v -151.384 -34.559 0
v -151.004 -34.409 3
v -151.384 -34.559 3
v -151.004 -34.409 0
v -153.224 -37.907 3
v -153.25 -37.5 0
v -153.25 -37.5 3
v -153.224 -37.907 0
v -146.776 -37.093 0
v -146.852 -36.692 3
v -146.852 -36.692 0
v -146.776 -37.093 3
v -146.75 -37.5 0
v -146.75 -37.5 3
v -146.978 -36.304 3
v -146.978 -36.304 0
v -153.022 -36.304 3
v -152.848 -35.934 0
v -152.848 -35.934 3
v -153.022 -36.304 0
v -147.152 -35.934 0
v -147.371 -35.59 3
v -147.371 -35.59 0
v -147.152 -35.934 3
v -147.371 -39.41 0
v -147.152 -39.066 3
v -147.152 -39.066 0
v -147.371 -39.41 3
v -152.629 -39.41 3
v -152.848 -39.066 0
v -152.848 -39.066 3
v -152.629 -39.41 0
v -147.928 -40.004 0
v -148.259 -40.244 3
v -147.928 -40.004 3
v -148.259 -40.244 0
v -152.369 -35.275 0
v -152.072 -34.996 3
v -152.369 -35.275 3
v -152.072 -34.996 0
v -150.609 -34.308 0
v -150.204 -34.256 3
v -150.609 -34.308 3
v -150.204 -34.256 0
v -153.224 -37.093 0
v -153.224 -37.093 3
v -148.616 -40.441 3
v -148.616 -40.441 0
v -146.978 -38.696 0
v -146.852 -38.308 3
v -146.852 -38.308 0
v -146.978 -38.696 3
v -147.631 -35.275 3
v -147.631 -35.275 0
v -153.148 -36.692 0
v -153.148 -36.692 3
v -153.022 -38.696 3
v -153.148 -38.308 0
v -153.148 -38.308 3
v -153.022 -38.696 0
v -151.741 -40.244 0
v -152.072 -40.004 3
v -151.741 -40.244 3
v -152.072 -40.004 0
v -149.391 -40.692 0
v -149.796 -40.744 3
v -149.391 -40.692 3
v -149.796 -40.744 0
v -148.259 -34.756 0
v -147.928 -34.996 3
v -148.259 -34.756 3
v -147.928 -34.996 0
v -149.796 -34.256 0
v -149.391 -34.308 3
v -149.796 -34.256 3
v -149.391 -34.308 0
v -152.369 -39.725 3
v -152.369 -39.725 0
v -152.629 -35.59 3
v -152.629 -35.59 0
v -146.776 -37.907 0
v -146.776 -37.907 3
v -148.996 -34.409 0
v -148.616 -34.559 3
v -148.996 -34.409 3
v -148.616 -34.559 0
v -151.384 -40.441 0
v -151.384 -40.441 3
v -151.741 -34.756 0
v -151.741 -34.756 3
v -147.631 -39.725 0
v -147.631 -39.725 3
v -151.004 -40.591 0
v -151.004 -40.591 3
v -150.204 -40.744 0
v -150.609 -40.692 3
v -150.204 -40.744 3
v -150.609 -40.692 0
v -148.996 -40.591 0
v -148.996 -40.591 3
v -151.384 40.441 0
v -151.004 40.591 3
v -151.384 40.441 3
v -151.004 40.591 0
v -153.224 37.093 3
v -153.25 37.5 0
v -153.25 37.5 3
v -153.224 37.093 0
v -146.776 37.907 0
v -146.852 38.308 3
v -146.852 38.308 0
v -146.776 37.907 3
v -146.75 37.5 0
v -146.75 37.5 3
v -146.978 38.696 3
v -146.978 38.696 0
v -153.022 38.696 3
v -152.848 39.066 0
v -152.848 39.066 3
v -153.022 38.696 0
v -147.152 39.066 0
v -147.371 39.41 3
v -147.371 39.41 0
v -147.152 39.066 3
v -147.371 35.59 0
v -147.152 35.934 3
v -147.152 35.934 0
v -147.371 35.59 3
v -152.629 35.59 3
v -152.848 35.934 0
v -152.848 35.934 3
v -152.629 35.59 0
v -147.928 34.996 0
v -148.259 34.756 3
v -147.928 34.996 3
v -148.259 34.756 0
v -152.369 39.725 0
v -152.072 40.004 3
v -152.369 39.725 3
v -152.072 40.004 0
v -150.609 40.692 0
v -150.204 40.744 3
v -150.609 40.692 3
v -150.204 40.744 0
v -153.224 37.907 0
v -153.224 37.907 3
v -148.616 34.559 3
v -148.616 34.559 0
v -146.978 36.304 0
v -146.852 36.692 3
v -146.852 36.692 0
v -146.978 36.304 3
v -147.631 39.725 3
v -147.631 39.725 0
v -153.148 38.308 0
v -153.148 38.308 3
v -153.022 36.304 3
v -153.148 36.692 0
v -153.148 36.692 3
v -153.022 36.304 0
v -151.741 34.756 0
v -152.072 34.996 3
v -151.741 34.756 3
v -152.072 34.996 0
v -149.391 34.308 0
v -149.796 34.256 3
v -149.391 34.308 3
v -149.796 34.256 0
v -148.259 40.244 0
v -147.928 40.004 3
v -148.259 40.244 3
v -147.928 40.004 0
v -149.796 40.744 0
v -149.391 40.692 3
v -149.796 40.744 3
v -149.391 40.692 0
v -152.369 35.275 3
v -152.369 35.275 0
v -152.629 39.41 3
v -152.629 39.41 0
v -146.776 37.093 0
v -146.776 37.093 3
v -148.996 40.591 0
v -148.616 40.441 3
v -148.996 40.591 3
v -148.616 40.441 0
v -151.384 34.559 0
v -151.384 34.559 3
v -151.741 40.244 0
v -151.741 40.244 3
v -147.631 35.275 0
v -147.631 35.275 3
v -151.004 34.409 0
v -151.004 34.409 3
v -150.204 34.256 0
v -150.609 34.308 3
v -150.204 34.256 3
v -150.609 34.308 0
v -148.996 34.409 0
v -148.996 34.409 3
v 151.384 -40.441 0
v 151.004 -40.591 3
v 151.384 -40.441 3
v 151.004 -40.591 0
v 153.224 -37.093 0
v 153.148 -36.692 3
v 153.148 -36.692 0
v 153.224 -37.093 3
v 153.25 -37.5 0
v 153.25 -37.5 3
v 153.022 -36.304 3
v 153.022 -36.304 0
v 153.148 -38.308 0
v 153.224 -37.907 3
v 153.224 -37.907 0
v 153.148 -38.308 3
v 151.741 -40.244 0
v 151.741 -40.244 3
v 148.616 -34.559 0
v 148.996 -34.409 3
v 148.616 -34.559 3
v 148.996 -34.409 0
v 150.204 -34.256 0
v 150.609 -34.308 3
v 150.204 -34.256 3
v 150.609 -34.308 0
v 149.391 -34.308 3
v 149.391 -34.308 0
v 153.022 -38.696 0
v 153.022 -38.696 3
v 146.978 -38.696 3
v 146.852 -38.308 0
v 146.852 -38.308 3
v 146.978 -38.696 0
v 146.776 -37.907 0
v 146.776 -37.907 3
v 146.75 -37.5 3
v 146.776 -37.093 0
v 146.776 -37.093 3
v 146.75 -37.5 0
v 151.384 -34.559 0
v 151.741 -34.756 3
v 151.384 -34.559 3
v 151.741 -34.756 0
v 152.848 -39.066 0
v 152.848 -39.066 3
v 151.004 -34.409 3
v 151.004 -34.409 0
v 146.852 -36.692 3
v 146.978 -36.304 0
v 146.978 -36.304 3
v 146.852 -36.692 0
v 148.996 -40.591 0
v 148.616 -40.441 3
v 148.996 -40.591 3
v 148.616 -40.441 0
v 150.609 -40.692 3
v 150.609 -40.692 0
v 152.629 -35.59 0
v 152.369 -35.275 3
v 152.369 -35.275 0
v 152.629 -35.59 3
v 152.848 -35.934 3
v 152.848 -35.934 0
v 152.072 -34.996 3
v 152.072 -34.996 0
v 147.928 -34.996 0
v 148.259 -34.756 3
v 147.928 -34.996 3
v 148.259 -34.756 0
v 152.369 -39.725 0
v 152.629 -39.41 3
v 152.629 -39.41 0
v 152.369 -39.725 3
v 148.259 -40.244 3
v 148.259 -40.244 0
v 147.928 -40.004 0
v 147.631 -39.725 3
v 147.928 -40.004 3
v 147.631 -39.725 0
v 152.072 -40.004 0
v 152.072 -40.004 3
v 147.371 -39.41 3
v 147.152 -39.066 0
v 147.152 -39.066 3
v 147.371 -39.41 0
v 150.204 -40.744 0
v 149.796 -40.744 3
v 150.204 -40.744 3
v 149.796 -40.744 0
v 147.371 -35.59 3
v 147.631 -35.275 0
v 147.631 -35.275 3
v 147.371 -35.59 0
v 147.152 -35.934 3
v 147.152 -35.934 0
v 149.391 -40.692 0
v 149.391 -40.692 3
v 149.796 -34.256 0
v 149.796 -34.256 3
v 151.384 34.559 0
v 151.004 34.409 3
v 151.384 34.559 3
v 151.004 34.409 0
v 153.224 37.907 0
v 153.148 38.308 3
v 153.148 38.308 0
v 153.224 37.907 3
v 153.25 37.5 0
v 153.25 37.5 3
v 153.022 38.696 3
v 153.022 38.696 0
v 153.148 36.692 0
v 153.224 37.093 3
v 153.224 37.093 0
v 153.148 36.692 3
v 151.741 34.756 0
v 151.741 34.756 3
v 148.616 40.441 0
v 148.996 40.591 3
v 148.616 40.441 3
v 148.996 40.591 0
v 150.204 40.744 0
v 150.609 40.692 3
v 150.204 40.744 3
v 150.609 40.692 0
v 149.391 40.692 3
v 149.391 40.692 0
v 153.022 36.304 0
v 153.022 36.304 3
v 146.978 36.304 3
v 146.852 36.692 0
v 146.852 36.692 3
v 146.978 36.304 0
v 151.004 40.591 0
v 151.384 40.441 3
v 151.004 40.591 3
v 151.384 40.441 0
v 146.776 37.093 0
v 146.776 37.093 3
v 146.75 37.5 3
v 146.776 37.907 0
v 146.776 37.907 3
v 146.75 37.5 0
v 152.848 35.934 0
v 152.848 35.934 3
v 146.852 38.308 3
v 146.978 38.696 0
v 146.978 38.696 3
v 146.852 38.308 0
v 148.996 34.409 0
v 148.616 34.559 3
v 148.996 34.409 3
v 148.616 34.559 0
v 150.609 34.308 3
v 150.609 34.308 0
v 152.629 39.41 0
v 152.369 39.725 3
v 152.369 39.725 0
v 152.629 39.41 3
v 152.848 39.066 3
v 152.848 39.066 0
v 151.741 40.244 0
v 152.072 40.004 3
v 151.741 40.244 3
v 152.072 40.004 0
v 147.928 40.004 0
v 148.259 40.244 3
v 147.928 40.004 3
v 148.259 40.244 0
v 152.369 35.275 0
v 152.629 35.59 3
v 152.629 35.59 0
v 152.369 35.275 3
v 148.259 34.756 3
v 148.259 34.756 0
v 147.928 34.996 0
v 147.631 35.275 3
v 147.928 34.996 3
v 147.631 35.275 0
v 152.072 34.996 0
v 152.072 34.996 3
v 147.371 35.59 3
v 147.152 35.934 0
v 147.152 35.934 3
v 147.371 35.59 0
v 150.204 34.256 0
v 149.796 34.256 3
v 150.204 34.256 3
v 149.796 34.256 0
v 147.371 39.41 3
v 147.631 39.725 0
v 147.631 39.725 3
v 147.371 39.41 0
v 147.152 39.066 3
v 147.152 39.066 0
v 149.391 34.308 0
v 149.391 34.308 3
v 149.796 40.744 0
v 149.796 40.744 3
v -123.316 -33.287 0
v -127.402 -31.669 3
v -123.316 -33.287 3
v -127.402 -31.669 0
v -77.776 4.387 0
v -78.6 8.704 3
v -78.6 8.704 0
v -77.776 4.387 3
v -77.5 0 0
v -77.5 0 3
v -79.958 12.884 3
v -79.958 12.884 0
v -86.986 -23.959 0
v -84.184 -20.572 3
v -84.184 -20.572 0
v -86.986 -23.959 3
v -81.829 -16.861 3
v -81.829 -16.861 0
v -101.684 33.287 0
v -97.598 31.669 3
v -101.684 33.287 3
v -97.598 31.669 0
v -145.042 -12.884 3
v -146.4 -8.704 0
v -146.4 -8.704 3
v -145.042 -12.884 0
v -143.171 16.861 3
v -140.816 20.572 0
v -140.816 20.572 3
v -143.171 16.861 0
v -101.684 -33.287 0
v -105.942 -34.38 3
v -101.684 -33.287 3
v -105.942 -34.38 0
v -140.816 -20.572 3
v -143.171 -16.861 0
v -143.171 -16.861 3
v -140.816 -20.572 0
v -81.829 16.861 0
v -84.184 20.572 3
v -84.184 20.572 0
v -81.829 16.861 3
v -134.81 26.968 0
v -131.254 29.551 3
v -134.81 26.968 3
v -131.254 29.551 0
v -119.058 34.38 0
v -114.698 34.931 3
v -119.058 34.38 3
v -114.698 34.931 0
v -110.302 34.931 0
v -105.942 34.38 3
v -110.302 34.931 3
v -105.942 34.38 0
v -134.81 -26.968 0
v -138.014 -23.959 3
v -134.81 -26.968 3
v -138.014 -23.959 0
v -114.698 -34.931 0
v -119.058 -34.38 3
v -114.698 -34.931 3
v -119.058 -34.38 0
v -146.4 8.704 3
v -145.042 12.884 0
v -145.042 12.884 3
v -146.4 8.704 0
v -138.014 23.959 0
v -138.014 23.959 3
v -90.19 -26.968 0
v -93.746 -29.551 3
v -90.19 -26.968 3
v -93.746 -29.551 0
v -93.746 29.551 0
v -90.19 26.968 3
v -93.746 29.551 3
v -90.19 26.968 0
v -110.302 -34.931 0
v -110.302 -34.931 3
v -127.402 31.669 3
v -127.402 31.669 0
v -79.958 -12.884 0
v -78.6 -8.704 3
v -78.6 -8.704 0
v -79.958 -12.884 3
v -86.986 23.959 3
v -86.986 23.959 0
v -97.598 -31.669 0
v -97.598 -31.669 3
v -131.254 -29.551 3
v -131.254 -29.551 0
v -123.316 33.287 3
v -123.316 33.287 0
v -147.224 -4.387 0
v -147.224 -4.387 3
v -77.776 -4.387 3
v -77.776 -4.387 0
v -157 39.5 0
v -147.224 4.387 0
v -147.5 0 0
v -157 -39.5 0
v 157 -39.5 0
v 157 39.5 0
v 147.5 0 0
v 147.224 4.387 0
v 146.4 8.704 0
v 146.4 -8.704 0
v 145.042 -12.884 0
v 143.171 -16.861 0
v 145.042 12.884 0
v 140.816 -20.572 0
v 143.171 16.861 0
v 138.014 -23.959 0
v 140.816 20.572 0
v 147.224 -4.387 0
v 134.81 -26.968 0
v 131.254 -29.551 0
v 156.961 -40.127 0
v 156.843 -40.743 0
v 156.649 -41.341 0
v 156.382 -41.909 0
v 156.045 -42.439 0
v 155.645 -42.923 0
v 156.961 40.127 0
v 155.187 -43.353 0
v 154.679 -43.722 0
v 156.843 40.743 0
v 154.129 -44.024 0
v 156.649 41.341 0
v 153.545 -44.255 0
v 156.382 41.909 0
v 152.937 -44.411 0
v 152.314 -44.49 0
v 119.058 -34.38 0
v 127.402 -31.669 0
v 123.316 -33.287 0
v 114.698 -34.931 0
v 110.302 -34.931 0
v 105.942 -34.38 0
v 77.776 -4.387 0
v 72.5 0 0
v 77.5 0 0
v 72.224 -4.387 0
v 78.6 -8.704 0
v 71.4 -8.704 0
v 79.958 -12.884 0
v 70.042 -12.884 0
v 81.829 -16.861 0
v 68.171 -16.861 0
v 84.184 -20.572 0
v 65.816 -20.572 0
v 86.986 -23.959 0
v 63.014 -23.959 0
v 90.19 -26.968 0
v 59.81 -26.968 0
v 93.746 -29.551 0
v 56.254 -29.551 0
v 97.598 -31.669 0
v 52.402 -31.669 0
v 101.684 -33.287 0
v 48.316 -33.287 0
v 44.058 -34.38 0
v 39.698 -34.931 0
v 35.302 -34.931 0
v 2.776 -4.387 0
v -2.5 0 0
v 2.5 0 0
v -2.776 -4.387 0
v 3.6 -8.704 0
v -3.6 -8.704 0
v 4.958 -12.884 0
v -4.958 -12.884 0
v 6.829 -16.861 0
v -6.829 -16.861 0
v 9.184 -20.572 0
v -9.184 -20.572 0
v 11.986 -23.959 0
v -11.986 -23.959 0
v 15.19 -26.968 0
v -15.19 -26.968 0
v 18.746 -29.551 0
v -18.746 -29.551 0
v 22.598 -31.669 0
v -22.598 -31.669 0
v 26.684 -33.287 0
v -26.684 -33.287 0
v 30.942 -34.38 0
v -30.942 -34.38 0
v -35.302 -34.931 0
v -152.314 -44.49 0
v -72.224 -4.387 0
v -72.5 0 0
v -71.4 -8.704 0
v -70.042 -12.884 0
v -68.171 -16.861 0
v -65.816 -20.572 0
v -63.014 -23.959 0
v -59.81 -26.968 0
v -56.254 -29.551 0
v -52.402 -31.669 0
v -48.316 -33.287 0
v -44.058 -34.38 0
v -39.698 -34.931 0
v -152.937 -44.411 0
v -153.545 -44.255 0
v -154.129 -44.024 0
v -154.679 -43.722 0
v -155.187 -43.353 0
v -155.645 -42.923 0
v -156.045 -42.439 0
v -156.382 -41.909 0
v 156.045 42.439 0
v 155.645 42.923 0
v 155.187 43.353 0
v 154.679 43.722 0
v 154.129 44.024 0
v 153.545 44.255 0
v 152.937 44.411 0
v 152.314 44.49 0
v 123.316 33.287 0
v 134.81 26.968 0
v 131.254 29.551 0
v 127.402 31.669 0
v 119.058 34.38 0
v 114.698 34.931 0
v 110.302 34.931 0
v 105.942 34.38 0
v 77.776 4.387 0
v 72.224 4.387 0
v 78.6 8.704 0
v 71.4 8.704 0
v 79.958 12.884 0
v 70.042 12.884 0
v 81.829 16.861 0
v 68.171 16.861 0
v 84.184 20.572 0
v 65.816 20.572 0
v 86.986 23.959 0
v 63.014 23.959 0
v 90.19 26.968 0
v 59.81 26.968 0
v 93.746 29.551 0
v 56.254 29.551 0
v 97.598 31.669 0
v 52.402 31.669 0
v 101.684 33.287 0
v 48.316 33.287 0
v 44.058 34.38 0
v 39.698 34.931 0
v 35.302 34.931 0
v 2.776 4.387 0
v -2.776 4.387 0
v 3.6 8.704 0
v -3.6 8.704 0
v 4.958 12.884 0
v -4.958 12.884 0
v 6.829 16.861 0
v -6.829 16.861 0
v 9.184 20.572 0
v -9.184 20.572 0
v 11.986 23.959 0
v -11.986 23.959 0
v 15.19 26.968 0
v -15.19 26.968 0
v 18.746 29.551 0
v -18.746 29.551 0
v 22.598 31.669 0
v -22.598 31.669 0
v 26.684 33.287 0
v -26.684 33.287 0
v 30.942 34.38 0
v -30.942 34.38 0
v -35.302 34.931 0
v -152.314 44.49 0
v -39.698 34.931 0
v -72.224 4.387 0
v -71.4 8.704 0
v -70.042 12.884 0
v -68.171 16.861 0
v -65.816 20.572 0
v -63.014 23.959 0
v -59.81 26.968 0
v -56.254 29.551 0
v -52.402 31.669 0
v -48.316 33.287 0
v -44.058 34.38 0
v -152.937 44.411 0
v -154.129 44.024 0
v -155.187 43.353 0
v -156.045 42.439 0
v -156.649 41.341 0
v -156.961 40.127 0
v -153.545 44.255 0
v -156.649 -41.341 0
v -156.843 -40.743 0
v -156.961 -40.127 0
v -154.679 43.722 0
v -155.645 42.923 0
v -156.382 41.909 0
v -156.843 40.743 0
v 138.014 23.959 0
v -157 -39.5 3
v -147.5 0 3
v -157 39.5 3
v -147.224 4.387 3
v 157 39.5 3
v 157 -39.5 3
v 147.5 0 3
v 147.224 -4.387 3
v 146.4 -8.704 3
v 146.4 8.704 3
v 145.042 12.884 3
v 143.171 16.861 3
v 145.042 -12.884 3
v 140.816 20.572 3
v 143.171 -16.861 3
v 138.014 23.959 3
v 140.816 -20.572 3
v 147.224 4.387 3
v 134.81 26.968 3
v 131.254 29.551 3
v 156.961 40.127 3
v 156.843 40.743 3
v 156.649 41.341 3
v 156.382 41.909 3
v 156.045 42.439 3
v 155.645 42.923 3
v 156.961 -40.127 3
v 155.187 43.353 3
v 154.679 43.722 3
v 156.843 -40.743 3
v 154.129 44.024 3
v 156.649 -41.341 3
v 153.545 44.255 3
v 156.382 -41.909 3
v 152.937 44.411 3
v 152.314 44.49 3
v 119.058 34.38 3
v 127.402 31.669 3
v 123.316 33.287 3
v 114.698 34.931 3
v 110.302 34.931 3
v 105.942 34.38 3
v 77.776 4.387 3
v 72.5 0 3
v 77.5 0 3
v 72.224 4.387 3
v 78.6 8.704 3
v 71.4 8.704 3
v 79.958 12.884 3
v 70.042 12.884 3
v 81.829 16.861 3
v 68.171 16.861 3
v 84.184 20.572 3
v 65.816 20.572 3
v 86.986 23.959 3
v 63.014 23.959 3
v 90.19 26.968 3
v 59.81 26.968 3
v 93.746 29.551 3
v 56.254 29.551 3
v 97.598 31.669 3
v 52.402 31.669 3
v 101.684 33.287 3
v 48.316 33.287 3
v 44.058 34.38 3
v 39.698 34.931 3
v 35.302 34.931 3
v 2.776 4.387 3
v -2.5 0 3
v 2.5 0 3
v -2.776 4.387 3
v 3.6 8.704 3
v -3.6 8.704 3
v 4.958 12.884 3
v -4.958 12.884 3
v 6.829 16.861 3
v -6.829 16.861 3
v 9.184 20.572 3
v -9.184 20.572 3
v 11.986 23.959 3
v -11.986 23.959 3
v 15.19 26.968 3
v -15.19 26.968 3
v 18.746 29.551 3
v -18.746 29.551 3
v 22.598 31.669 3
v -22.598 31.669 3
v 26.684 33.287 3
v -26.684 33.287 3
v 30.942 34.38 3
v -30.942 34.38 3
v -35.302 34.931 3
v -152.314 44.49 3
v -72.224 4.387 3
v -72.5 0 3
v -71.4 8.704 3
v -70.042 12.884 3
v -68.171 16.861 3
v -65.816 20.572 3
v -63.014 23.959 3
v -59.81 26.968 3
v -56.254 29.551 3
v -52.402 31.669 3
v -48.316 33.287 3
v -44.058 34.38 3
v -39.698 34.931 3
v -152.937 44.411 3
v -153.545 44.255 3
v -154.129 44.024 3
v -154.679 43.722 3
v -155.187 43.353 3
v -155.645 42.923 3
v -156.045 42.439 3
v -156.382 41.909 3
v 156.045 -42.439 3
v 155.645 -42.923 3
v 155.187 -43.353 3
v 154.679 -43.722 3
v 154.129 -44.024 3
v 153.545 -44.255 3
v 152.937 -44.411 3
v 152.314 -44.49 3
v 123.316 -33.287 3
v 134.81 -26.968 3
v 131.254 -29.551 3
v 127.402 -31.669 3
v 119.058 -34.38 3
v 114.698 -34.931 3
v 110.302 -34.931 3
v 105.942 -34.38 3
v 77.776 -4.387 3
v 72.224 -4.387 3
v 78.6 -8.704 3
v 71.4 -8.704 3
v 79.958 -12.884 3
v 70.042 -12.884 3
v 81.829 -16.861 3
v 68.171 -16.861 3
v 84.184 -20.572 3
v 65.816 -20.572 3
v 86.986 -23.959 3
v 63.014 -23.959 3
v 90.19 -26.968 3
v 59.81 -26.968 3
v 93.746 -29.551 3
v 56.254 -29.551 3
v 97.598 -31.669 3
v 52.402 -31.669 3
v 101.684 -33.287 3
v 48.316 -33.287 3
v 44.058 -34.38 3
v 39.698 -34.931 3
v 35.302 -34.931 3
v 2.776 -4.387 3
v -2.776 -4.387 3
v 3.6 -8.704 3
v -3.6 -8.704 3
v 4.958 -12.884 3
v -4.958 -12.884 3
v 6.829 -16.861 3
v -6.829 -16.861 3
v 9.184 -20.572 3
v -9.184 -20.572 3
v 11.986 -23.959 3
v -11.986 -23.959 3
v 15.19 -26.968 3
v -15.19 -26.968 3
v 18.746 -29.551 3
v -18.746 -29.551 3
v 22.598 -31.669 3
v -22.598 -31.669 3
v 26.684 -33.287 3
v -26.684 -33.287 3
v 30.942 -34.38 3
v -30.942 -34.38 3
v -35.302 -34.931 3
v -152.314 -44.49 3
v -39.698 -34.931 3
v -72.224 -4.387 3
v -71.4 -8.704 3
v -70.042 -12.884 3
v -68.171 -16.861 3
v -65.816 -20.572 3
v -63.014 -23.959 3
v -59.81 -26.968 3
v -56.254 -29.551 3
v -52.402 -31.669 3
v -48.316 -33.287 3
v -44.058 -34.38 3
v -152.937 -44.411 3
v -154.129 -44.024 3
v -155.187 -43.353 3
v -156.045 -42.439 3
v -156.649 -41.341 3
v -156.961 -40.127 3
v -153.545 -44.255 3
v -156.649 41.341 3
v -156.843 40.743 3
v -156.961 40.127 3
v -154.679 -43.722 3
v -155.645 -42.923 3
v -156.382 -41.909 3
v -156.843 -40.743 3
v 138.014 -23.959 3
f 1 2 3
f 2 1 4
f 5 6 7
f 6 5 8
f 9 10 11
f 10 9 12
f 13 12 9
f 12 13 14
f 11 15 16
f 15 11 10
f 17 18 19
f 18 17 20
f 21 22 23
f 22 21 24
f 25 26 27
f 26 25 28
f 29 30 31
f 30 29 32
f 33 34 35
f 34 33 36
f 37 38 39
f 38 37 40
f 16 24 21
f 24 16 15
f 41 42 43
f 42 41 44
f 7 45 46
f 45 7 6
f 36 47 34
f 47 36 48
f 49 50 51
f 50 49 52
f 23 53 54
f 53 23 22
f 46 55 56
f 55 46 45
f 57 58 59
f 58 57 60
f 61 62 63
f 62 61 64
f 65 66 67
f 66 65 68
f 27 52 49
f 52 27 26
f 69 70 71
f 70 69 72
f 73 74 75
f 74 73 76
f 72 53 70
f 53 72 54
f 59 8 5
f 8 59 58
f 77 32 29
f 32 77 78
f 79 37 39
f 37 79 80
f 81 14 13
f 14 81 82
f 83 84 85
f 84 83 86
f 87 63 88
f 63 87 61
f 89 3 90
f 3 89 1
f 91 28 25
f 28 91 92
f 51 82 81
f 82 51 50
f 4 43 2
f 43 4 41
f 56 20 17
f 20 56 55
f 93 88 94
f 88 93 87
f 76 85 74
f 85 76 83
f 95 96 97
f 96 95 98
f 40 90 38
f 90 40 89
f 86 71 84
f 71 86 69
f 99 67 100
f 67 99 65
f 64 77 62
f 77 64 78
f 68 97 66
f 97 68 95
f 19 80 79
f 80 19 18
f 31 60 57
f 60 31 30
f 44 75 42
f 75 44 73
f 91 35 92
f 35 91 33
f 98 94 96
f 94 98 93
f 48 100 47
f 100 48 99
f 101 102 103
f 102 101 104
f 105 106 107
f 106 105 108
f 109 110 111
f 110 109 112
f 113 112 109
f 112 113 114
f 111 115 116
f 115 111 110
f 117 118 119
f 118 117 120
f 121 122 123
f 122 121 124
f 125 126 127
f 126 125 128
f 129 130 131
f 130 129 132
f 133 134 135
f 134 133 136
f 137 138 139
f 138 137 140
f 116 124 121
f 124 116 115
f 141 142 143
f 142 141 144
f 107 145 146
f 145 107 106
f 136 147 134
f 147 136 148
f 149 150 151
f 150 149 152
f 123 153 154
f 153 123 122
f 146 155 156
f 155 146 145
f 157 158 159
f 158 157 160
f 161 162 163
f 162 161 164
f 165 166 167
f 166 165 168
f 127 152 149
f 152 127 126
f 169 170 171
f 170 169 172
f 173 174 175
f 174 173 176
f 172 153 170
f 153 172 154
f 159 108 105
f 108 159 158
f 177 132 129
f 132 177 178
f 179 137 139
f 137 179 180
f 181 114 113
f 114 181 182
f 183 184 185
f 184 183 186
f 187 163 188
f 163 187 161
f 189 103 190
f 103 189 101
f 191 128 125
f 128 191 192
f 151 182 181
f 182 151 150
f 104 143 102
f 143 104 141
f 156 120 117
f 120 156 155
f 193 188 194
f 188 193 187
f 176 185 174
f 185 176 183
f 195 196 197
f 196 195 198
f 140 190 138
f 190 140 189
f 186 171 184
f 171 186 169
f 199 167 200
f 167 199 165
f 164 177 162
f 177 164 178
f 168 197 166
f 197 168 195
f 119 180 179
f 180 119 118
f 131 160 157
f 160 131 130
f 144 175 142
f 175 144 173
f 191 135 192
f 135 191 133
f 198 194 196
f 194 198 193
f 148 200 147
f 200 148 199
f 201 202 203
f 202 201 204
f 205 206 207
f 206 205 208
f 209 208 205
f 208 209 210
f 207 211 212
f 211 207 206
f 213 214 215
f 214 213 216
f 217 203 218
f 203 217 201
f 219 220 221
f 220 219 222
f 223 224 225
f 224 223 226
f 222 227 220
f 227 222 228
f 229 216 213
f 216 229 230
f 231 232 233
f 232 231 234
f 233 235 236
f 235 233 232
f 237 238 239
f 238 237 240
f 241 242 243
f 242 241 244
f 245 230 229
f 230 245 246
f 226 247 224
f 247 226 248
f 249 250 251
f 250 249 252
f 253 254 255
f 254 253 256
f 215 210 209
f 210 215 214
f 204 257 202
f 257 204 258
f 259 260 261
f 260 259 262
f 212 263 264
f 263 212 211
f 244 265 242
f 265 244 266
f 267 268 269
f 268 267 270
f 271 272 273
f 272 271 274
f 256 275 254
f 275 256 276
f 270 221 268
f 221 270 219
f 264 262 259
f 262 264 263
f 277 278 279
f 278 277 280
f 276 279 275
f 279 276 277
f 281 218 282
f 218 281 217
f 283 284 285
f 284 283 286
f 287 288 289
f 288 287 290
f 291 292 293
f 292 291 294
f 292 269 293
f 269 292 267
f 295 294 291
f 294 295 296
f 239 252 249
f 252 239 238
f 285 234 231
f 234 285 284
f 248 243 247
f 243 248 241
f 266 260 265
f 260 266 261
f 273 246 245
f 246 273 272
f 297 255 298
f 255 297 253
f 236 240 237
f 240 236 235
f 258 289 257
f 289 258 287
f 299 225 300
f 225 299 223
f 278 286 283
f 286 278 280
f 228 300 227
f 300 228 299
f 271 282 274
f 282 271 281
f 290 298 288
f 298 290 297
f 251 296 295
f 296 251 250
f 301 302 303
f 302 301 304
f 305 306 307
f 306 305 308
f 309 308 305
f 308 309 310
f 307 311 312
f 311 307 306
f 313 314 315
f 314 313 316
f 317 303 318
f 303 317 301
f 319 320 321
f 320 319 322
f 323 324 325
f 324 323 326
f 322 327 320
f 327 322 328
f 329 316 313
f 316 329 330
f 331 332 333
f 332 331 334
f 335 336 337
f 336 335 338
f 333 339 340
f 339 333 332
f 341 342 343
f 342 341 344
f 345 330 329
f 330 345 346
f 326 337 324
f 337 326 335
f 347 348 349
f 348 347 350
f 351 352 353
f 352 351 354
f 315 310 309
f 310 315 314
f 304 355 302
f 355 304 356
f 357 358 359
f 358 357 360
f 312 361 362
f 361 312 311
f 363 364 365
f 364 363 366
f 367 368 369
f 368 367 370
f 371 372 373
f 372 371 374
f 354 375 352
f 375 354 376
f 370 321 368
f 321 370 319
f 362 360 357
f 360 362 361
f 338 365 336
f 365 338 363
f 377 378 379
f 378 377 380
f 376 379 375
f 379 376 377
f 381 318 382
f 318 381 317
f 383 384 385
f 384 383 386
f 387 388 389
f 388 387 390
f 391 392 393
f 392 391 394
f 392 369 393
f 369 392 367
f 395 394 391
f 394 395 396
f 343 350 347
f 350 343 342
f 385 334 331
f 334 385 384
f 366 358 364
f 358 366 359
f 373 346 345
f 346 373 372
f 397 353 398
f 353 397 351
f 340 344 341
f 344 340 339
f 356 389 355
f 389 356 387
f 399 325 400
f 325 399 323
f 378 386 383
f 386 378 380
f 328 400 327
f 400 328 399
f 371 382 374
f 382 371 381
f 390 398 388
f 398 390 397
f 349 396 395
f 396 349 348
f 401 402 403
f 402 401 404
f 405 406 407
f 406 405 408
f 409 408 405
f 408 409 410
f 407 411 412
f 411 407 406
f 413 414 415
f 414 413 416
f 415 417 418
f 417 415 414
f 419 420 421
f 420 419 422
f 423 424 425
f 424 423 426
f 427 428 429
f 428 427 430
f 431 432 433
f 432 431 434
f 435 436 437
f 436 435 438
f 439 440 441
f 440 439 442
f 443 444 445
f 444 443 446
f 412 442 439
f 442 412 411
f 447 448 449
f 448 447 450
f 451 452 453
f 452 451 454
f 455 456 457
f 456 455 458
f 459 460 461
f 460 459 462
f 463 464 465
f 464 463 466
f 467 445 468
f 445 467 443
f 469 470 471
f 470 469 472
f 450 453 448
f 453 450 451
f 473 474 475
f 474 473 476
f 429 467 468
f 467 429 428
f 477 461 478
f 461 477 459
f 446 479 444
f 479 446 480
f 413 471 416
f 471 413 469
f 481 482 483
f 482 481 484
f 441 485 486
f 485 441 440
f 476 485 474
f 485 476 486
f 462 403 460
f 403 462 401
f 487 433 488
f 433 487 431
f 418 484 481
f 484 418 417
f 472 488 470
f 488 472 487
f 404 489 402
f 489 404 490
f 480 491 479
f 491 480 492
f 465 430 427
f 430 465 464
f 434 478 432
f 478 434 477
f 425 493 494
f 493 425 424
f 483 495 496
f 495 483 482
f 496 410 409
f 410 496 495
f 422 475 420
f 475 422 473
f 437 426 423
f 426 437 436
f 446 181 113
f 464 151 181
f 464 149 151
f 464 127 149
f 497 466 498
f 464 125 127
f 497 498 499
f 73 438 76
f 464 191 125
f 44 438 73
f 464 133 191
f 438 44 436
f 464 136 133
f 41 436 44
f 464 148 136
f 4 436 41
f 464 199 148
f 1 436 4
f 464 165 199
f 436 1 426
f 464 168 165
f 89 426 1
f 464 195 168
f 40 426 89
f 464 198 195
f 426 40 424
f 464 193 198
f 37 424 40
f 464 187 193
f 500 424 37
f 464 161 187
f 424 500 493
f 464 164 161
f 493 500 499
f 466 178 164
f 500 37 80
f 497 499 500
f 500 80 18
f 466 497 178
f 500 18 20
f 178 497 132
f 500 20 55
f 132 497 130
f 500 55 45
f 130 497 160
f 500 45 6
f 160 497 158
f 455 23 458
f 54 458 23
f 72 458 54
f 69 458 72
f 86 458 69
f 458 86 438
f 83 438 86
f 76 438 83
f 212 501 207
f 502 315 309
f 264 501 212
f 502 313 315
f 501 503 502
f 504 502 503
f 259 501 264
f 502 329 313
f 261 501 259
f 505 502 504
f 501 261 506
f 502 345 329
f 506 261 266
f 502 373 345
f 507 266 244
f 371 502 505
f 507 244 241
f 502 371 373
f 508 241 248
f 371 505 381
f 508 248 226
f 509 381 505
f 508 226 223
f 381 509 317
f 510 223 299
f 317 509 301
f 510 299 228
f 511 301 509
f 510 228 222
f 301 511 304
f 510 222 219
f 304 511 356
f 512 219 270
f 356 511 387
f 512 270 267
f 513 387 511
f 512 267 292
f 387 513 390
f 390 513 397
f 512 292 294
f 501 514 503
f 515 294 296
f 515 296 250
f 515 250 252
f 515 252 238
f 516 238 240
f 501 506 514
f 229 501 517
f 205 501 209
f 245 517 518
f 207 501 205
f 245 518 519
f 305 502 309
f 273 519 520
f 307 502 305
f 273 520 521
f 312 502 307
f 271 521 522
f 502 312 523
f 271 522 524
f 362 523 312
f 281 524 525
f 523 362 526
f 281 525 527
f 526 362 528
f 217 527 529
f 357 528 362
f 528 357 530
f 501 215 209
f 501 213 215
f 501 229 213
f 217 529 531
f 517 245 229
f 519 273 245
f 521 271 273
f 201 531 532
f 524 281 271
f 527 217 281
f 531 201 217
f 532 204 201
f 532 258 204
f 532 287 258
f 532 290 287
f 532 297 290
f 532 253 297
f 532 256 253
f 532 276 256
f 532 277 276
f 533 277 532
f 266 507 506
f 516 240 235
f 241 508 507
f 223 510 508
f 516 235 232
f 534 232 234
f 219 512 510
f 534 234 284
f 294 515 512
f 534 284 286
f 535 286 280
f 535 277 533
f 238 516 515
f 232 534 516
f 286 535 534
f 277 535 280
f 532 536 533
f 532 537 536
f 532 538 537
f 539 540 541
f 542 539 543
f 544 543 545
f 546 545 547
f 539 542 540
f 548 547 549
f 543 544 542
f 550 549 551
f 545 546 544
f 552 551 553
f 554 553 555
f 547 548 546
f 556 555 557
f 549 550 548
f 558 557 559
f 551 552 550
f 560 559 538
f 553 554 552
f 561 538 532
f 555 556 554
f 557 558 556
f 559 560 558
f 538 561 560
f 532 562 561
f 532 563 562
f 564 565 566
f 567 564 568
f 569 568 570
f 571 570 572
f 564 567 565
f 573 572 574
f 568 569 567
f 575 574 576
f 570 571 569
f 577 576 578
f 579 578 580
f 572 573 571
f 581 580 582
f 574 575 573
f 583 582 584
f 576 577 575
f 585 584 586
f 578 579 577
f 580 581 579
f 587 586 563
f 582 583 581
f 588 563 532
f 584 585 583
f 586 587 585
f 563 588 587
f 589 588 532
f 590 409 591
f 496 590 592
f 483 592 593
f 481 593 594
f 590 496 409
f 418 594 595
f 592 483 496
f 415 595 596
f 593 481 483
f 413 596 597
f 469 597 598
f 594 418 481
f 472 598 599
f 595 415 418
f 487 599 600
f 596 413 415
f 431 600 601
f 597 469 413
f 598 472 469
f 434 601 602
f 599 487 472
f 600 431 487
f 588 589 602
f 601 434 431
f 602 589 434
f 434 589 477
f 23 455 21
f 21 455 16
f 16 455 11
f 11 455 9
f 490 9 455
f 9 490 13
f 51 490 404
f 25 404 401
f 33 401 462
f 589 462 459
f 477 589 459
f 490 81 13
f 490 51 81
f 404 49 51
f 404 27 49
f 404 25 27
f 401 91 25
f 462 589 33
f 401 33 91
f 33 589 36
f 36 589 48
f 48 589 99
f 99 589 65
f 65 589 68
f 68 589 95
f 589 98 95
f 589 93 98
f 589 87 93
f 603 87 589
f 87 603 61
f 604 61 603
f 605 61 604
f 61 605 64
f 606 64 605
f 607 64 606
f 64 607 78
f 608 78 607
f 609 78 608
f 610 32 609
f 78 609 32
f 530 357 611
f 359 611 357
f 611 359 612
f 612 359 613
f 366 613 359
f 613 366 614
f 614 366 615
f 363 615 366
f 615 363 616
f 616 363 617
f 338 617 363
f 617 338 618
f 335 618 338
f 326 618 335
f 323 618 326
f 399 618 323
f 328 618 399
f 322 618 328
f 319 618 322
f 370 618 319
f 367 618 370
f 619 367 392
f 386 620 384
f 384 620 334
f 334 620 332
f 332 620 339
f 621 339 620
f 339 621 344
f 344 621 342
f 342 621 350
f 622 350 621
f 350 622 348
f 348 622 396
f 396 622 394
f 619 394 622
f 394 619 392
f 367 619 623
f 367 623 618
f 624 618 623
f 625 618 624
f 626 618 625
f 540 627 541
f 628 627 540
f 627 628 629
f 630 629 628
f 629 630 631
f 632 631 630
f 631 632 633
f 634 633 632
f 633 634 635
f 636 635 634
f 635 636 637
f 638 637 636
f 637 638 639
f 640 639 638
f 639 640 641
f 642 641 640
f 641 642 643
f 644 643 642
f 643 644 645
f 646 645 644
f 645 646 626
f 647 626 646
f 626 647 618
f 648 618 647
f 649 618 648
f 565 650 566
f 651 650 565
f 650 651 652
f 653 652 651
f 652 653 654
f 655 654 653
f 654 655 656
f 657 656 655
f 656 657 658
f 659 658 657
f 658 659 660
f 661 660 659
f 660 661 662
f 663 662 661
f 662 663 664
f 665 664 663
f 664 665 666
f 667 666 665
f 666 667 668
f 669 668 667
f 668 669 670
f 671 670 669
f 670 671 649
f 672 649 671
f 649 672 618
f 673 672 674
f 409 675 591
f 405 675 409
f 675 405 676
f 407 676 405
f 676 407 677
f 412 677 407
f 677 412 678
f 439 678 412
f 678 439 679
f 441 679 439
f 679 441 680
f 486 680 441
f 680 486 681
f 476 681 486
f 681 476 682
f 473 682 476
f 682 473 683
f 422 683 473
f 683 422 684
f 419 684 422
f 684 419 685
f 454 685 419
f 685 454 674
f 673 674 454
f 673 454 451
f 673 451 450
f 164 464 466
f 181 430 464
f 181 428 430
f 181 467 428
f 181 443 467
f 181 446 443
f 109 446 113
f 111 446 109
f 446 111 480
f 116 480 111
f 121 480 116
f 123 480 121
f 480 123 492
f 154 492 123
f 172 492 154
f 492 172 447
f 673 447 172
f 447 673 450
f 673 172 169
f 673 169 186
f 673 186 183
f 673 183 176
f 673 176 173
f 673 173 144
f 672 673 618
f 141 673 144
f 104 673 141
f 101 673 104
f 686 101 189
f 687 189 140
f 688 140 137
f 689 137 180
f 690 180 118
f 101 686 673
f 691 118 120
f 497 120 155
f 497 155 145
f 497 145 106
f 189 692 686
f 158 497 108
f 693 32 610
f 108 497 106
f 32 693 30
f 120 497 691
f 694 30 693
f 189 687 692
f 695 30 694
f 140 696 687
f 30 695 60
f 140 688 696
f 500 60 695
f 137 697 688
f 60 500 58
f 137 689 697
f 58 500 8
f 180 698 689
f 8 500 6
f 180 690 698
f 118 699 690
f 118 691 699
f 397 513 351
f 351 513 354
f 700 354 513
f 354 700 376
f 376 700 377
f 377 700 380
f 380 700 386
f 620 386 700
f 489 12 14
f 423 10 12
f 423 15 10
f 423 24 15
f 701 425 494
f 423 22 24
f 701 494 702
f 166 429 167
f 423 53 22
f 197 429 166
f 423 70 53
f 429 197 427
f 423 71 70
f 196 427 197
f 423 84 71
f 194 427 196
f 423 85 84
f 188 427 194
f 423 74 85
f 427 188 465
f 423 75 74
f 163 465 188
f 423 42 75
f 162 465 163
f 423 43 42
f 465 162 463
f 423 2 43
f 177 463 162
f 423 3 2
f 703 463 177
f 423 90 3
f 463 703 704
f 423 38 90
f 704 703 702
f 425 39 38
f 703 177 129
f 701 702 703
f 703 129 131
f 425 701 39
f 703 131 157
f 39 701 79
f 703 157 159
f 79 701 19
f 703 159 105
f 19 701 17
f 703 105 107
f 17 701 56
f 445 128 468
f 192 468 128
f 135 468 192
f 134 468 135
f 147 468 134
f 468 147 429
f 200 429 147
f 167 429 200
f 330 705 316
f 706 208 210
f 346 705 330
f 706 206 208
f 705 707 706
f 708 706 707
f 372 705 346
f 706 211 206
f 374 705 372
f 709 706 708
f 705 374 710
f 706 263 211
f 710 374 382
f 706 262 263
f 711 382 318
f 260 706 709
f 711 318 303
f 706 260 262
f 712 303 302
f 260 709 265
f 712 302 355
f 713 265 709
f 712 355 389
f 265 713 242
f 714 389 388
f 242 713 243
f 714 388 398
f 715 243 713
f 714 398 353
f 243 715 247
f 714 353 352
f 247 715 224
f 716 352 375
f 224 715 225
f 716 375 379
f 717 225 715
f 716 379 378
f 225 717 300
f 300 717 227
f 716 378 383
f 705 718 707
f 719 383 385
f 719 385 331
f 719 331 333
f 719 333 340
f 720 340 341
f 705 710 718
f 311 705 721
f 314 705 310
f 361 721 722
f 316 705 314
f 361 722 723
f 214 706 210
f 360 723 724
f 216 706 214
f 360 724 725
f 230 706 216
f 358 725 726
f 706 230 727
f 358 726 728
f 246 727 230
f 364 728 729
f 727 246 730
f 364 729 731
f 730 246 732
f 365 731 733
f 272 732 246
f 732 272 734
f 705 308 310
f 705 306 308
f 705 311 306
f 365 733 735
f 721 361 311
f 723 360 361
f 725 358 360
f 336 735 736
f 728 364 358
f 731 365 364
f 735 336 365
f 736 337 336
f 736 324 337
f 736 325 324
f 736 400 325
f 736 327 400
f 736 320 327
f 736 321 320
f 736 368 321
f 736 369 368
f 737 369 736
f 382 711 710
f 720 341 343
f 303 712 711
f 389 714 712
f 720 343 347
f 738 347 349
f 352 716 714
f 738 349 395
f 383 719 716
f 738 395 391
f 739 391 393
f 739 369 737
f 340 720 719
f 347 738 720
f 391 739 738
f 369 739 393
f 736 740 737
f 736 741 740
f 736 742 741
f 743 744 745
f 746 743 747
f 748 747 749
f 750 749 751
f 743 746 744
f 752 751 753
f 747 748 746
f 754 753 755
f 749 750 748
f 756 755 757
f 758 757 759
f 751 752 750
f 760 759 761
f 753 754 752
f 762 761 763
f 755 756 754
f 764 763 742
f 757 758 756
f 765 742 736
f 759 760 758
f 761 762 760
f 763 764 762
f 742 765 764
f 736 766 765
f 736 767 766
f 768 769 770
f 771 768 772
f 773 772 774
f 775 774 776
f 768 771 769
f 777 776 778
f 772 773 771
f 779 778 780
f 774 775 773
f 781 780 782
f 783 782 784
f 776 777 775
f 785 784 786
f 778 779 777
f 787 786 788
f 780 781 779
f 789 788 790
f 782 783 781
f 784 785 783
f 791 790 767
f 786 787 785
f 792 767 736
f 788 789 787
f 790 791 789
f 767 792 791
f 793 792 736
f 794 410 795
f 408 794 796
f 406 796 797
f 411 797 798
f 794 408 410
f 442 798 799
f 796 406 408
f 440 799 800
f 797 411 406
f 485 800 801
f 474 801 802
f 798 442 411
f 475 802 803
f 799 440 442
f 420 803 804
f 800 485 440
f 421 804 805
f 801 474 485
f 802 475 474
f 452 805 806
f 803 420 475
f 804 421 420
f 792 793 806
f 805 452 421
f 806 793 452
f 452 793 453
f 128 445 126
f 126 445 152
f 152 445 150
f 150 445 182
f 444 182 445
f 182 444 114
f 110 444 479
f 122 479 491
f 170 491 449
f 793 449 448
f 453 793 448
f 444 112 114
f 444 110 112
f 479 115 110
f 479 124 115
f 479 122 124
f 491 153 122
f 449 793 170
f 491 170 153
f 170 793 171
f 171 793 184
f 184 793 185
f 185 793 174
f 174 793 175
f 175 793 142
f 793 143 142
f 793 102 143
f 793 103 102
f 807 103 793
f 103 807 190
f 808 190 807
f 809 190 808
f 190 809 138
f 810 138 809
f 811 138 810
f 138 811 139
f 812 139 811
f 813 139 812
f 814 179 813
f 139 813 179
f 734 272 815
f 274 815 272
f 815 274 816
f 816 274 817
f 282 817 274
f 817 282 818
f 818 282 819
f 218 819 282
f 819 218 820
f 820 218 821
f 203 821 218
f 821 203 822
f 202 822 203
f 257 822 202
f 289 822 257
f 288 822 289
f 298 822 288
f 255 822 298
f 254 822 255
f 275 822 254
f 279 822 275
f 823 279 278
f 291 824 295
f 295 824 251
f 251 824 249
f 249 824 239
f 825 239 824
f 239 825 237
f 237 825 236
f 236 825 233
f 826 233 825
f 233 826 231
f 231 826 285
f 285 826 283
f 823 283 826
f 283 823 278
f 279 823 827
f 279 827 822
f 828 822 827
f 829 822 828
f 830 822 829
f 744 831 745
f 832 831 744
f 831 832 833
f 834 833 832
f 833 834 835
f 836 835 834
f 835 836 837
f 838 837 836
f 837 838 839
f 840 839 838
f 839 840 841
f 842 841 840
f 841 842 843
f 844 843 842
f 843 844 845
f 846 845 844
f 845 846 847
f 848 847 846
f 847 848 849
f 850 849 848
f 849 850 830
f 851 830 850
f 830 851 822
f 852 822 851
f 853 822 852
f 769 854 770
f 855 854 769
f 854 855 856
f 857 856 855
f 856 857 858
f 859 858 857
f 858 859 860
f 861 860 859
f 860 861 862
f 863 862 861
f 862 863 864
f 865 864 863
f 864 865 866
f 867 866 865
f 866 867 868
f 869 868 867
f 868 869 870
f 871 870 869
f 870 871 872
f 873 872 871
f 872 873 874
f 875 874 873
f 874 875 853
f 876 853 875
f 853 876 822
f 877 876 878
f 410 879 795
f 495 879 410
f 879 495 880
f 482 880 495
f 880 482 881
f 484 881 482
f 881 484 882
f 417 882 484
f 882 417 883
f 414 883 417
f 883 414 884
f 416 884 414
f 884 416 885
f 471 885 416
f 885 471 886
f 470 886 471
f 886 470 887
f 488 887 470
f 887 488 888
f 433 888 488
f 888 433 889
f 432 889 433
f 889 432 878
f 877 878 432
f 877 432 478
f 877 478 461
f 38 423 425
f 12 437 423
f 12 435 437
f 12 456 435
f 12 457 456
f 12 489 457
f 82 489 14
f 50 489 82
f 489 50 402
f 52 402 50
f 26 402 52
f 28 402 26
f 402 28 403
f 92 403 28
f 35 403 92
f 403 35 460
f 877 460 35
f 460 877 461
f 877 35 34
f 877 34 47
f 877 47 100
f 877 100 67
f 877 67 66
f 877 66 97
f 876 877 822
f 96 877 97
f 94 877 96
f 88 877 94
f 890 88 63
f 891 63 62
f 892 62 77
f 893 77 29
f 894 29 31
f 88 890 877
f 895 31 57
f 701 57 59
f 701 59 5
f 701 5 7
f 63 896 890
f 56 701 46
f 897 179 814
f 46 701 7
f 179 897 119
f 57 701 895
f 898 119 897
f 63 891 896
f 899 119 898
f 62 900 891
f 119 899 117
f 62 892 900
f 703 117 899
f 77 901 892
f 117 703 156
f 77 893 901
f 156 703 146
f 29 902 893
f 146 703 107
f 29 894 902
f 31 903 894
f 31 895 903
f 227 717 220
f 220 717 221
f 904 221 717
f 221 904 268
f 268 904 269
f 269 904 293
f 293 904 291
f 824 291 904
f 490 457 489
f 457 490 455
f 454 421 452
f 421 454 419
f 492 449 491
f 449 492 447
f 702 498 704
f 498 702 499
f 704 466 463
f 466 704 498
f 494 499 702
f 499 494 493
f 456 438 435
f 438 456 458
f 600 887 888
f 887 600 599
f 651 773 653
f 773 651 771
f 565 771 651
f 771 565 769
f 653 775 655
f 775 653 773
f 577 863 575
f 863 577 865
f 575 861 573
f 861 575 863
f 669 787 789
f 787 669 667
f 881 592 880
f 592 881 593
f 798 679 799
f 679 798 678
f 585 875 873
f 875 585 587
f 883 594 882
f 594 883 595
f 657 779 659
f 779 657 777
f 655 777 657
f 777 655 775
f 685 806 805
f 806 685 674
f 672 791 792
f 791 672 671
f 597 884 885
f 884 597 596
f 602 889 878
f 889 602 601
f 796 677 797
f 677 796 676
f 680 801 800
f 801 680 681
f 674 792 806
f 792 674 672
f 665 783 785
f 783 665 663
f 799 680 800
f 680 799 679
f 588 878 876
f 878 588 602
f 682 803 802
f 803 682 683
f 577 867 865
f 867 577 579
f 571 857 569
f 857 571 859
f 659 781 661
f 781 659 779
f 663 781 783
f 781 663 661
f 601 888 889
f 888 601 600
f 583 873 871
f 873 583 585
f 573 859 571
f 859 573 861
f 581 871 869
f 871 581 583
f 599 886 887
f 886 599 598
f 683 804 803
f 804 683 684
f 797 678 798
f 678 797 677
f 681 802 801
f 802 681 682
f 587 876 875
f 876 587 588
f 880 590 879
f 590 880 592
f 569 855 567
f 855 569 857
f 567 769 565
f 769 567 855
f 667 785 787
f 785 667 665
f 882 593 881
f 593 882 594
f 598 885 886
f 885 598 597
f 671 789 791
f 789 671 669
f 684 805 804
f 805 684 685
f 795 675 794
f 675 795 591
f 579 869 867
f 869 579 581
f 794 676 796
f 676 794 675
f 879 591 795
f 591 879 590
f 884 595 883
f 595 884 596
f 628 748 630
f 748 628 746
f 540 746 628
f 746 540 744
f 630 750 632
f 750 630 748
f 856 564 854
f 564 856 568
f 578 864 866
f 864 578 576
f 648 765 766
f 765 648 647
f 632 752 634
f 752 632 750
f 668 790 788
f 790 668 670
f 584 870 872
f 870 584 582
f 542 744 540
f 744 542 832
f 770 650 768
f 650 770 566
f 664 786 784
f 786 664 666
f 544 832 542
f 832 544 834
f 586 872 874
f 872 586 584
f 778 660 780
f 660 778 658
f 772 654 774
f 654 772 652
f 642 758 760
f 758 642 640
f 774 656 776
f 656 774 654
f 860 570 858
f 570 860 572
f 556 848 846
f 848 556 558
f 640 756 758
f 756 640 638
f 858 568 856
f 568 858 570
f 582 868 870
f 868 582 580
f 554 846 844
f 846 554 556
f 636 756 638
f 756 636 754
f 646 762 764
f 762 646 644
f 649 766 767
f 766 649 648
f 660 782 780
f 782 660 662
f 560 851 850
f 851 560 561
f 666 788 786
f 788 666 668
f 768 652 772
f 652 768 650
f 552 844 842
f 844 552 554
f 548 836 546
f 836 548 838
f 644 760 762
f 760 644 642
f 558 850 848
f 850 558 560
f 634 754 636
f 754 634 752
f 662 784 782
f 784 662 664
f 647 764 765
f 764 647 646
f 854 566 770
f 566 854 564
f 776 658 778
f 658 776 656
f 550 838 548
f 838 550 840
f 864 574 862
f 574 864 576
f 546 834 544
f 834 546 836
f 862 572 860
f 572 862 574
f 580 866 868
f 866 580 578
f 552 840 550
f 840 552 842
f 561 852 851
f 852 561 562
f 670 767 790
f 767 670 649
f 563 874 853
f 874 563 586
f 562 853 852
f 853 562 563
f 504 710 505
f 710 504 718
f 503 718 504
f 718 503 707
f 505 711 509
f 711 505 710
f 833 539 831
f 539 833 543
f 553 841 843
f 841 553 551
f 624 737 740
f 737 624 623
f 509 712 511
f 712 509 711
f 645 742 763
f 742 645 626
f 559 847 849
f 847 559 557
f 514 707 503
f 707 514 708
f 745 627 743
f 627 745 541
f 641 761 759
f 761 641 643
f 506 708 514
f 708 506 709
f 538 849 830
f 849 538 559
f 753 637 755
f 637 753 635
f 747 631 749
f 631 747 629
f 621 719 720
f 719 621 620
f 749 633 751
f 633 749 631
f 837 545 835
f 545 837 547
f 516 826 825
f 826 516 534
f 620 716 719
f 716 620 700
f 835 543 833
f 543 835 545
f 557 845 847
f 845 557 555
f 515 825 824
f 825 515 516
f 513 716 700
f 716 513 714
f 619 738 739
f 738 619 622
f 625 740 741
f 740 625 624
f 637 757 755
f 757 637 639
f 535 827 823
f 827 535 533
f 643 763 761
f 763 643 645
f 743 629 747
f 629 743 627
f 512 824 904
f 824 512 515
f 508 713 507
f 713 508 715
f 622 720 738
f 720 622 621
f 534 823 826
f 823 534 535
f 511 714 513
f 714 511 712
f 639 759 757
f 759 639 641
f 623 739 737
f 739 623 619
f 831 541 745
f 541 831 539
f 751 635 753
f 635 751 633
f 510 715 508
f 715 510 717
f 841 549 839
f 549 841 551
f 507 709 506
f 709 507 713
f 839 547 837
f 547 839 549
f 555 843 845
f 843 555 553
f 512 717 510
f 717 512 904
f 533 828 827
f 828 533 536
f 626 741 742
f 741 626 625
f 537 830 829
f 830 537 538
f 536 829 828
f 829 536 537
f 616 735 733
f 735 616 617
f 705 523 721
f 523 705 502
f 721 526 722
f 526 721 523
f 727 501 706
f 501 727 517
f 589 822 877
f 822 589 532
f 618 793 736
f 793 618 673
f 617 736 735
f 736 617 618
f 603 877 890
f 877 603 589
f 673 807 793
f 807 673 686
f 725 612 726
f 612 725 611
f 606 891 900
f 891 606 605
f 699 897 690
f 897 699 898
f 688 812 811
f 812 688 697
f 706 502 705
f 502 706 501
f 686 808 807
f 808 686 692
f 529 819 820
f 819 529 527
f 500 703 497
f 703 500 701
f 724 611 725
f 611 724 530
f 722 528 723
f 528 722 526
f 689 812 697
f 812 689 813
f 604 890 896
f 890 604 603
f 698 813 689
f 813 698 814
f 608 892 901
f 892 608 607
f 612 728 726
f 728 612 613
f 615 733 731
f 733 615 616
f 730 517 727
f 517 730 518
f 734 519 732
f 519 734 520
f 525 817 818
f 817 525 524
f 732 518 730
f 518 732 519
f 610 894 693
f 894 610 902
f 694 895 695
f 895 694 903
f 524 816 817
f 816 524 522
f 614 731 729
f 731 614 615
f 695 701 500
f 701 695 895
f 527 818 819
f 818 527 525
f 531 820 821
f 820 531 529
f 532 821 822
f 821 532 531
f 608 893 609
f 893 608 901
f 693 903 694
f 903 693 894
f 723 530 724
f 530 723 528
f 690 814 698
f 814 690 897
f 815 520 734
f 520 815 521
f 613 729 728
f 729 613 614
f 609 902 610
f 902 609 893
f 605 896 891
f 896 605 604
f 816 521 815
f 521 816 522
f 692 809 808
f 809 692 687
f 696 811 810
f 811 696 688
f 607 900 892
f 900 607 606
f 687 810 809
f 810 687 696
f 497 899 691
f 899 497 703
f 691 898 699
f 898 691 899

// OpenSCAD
$fn = 50;


difference() {
	union() {
		hull() {
			translate(v = [-152.0000000000, 39.5000000000, 0]) {
				cylinder(h = 3, r = 5);
			}
			translate(v = [152.0000000000, 39.5000000000, 0]) {
				cylinder(h = 3, r = 5);
			}
			translate(v = [-152.0000000000, -39.5000000000, 0]) {
				cylinder(h = 3, r = 5);
			}
			translate(v = [152.0000000000, -39.5000000000, 0]) {
				cylinder(h = 3, r = 5);
			}
		}
	}
	union() {
		#translate(v = [-150.0000000000, -37.5000000000, -100.0000000000]) {
			cylinder(h = 200, r = 3.2500000000);
		}
		#translate(v = [-150.0000000000, 37.5000000000, -100.0000000000]) {
			cylinder(h = 200, r = 3.2500000000);
		}
		#translate(v = [150.0000000000, -37.5000000000, -100.0000000000]) {
			cylinder(h = 200, r = 3.2500000000);
		}
		#translate(v = [150.0000000000, 37.5000000000, -100.0000000000]) {
			cylinder(h = 200, r = 3.2500000000);
		}
		#translate(v = [-112.5000000000, 0, 0]) {
			cylinder(h = 3, r = 35.0000000000);
		}
		#translate(v = [-37.5000000000, 0, 0]) {
			cylinder(h = 3, r = 35.0000000000);
		}
		#translate(v = [37.5000000000, 0, 0]) {
			cylinder(h = 3, r = 35.0000000000);
		}
		#translate(v = [112.5000000000, 0, 0]) {
			cylinder(h = 3, r = 35.0000000000);
		}
	}
}
